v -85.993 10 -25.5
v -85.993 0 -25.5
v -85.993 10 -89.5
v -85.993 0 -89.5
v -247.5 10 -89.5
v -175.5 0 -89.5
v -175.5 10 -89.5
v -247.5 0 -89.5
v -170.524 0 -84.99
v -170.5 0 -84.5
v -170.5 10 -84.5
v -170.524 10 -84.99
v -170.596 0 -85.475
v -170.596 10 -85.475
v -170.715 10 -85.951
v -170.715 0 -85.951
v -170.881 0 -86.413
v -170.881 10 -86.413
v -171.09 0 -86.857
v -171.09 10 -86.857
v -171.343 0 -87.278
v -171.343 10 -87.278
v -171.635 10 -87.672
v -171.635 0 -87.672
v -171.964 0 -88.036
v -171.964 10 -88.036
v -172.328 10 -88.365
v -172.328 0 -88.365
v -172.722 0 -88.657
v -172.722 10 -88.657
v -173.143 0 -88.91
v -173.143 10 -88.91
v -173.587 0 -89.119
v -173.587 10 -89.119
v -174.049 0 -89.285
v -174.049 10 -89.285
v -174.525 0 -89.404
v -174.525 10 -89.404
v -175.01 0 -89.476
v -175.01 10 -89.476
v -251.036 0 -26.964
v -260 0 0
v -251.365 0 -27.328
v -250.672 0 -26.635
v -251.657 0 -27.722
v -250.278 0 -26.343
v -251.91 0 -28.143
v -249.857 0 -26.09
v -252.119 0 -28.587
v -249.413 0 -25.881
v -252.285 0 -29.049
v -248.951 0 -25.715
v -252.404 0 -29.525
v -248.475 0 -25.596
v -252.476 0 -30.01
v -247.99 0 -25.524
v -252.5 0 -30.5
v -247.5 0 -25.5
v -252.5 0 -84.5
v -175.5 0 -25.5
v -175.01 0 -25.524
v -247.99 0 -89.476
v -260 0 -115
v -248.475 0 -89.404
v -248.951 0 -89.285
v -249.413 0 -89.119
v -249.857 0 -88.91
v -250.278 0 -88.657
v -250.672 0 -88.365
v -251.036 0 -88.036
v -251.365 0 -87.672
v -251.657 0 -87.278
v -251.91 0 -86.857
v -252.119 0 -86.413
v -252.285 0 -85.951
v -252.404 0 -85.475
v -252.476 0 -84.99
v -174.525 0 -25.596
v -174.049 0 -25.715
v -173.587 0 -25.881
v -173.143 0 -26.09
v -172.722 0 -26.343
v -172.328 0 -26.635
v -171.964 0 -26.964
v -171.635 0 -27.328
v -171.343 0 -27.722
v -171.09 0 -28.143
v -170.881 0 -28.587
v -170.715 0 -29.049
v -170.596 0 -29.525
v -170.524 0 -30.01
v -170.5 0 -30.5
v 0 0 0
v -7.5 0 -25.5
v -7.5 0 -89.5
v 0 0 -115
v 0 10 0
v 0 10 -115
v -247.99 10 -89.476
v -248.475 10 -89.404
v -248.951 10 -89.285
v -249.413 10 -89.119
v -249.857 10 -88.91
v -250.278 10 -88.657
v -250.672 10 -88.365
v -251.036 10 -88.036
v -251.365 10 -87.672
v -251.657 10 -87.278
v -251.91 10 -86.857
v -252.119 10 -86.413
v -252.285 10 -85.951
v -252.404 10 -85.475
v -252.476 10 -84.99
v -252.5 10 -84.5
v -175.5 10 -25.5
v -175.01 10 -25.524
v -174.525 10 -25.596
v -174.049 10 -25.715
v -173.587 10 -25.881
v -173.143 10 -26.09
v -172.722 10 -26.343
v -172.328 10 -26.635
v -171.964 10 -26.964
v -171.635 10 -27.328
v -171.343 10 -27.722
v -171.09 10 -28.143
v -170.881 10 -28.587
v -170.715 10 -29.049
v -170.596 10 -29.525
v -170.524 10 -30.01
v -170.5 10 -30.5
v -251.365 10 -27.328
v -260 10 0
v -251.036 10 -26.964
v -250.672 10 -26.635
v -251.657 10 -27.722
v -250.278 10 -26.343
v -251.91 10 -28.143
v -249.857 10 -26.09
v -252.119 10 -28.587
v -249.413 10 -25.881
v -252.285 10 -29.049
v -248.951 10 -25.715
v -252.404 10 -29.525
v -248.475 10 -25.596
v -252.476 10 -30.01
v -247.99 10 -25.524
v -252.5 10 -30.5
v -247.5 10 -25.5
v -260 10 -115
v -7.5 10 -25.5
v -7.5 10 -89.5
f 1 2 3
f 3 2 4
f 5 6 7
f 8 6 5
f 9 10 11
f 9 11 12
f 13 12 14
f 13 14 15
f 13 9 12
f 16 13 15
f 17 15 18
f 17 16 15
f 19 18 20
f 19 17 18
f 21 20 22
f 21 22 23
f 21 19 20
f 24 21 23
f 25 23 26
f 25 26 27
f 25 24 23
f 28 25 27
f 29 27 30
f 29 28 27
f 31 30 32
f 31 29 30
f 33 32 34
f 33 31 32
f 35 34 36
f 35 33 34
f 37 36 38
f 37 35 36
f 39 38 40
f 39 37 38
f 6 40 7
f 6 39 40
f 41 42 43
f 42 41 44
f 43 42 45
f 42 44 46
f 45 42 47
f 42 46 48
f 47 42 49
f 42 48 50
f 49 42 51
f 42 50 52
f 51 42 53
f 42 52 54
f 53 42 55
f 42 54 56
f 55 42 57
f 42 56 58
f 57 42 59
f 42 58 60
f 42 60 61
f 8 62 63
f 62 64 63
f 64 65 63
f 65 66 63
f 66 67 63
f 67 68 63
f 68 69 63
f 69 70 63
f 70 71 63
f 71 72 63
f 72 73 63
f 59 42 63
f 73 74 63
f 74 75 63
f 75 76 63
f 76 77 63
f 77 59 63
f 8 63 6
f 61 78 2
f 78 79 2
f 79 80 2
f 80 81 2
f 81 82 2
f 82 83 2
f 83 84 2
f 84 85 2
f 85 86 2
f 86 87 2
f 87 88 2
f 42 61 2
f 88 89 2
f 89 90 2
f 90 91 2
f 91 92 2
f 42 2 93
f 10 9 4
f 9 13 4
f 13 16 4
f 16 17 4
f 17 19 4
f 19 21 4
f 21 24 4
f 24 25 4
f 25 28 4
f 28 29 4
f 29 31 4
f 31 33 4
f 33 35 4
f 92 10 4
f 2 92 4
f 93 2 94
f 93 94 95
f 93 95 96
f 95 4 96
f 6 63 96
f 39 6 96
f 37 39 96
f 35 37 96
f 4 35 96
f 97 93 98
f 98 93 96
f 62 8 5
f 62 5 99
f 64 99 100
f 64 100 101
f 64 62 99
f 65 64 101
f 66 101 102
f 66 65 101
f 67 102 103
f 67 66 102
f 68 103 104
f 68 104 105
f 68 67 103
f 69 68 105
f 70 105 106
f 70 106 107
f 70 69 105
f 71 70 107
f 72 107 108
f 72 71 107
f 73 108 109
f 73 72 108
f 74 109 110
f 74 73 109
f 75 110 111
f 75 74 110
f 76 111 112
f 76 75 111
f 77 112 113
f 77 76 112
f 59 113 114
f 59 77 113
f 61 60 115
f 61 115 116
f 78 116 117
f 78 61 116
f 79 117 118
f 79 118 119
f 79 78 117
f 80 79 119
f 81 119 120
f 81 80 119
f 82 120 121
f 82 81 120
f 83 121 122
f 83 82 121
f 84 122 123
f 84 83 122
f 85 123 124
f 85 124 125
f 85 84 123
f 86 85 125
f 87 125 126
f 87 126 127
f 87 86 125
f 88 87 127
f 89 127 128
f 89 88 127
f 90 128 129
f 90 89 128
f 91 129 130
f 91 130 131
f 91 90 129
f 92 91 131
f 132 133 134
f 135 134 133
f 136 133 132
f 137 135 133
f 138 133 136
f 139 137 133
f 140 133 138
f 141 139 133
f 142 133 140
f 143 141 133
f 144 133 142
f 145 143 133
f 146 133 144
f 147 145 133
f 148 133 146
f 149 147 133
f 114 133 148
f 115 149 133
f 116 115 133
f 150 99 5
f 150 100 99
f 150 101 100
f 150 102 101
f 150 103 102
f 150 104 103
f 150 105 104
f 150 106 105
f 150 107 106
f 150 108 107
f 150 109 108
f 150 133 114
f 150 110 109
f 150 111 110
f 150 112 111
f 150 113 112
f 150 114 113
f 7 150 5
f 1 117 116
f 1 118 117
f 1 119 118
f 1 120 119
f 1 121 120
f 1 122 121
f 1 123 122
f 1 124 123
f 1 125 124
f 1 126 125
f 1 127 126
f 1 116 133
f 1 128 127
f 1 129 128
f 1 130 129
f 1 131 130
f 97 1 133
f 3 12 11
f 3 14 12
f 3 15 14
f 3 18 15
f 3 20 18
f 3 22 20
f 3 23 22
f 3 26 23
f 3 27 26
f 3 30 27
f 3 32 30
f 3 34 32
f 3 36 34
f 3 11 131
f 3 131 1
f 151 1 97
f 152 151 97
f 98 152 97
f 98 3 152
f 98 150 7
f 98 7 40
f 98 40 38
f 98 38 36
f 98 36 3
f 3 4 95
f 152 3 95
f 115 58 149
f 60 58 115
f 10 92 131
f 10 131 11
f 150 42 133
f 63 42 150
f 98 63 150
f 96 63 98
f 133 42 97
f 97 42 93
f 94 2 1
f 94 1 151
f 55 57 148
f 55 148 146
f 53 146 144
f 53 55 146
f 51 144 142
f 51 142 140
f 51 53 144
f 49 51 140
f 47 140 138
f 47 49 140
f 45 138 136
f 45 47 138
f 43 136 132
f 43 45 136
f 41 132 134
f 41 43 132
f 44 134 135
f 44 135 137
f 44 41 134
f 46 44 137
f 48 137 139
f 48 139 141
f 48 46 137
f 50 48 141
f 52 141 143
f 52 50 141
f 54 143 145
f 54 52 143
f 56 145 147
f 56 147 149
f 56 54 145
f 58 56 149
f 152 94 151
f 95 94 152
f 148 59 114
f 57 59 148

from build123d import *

# Parameters (mm, degrees)
SKETCH1_W           = 260
SKETCH1_H           = 115
SKETCH1_W_2         = 78.493115051
SKETCH1_H_2         = 64
BOSS_EXTRUDE1_DEPTH = 10


with BuildPart() as part:
    # Sketch1 → Boss-Extrude1 (new body)
    with BuildSketch(Plane(origin=(0, 0, 0), x_dir=(1, 0, 0), z_dir=(0, 1, 0))):
        with Locations((-130, 57.5)):
            Rectangle(SKETCH1_W, SKETCH1_H)
        with BuildLine():
            ThreePointArc((-247.5, 89.5), (-251.035533906, 88.035533906), (-252.5, 84.5))
            Line((-252.5, 84.5), (-252.5, 30.5))
            ThreePointArc((-252.5, 30.5), (-251.035533906, 26.964466094), (-247.5, 25.5))
            Line((-247.5, 25.5), (-175.5, 25.5))
            ThreePointArc((-175.5, 25.5), (-171.964466094, 26.964466094), (-170.5, 30.5))
            Line((-170.5, 30.5), (-170.5, 84.5))
            ThreePointArc((-170.5, 84.5), (-171.964466094, 88.035533906), (-175.5, 89.5))
            Line((-175.5, 89.5), (-247.5, 89.5))
        make_face(mode=Mode.SUBTRACT)
        with Locations((-46.746557526, 57.5)):
            Rectangle(SKETCH1_W_2, SKETCH1_H_2, mode=Mode.SUBTRACT)
    extrude(amount=BOSS_EXTRUDE1_DEPTH)


solid = part.part
